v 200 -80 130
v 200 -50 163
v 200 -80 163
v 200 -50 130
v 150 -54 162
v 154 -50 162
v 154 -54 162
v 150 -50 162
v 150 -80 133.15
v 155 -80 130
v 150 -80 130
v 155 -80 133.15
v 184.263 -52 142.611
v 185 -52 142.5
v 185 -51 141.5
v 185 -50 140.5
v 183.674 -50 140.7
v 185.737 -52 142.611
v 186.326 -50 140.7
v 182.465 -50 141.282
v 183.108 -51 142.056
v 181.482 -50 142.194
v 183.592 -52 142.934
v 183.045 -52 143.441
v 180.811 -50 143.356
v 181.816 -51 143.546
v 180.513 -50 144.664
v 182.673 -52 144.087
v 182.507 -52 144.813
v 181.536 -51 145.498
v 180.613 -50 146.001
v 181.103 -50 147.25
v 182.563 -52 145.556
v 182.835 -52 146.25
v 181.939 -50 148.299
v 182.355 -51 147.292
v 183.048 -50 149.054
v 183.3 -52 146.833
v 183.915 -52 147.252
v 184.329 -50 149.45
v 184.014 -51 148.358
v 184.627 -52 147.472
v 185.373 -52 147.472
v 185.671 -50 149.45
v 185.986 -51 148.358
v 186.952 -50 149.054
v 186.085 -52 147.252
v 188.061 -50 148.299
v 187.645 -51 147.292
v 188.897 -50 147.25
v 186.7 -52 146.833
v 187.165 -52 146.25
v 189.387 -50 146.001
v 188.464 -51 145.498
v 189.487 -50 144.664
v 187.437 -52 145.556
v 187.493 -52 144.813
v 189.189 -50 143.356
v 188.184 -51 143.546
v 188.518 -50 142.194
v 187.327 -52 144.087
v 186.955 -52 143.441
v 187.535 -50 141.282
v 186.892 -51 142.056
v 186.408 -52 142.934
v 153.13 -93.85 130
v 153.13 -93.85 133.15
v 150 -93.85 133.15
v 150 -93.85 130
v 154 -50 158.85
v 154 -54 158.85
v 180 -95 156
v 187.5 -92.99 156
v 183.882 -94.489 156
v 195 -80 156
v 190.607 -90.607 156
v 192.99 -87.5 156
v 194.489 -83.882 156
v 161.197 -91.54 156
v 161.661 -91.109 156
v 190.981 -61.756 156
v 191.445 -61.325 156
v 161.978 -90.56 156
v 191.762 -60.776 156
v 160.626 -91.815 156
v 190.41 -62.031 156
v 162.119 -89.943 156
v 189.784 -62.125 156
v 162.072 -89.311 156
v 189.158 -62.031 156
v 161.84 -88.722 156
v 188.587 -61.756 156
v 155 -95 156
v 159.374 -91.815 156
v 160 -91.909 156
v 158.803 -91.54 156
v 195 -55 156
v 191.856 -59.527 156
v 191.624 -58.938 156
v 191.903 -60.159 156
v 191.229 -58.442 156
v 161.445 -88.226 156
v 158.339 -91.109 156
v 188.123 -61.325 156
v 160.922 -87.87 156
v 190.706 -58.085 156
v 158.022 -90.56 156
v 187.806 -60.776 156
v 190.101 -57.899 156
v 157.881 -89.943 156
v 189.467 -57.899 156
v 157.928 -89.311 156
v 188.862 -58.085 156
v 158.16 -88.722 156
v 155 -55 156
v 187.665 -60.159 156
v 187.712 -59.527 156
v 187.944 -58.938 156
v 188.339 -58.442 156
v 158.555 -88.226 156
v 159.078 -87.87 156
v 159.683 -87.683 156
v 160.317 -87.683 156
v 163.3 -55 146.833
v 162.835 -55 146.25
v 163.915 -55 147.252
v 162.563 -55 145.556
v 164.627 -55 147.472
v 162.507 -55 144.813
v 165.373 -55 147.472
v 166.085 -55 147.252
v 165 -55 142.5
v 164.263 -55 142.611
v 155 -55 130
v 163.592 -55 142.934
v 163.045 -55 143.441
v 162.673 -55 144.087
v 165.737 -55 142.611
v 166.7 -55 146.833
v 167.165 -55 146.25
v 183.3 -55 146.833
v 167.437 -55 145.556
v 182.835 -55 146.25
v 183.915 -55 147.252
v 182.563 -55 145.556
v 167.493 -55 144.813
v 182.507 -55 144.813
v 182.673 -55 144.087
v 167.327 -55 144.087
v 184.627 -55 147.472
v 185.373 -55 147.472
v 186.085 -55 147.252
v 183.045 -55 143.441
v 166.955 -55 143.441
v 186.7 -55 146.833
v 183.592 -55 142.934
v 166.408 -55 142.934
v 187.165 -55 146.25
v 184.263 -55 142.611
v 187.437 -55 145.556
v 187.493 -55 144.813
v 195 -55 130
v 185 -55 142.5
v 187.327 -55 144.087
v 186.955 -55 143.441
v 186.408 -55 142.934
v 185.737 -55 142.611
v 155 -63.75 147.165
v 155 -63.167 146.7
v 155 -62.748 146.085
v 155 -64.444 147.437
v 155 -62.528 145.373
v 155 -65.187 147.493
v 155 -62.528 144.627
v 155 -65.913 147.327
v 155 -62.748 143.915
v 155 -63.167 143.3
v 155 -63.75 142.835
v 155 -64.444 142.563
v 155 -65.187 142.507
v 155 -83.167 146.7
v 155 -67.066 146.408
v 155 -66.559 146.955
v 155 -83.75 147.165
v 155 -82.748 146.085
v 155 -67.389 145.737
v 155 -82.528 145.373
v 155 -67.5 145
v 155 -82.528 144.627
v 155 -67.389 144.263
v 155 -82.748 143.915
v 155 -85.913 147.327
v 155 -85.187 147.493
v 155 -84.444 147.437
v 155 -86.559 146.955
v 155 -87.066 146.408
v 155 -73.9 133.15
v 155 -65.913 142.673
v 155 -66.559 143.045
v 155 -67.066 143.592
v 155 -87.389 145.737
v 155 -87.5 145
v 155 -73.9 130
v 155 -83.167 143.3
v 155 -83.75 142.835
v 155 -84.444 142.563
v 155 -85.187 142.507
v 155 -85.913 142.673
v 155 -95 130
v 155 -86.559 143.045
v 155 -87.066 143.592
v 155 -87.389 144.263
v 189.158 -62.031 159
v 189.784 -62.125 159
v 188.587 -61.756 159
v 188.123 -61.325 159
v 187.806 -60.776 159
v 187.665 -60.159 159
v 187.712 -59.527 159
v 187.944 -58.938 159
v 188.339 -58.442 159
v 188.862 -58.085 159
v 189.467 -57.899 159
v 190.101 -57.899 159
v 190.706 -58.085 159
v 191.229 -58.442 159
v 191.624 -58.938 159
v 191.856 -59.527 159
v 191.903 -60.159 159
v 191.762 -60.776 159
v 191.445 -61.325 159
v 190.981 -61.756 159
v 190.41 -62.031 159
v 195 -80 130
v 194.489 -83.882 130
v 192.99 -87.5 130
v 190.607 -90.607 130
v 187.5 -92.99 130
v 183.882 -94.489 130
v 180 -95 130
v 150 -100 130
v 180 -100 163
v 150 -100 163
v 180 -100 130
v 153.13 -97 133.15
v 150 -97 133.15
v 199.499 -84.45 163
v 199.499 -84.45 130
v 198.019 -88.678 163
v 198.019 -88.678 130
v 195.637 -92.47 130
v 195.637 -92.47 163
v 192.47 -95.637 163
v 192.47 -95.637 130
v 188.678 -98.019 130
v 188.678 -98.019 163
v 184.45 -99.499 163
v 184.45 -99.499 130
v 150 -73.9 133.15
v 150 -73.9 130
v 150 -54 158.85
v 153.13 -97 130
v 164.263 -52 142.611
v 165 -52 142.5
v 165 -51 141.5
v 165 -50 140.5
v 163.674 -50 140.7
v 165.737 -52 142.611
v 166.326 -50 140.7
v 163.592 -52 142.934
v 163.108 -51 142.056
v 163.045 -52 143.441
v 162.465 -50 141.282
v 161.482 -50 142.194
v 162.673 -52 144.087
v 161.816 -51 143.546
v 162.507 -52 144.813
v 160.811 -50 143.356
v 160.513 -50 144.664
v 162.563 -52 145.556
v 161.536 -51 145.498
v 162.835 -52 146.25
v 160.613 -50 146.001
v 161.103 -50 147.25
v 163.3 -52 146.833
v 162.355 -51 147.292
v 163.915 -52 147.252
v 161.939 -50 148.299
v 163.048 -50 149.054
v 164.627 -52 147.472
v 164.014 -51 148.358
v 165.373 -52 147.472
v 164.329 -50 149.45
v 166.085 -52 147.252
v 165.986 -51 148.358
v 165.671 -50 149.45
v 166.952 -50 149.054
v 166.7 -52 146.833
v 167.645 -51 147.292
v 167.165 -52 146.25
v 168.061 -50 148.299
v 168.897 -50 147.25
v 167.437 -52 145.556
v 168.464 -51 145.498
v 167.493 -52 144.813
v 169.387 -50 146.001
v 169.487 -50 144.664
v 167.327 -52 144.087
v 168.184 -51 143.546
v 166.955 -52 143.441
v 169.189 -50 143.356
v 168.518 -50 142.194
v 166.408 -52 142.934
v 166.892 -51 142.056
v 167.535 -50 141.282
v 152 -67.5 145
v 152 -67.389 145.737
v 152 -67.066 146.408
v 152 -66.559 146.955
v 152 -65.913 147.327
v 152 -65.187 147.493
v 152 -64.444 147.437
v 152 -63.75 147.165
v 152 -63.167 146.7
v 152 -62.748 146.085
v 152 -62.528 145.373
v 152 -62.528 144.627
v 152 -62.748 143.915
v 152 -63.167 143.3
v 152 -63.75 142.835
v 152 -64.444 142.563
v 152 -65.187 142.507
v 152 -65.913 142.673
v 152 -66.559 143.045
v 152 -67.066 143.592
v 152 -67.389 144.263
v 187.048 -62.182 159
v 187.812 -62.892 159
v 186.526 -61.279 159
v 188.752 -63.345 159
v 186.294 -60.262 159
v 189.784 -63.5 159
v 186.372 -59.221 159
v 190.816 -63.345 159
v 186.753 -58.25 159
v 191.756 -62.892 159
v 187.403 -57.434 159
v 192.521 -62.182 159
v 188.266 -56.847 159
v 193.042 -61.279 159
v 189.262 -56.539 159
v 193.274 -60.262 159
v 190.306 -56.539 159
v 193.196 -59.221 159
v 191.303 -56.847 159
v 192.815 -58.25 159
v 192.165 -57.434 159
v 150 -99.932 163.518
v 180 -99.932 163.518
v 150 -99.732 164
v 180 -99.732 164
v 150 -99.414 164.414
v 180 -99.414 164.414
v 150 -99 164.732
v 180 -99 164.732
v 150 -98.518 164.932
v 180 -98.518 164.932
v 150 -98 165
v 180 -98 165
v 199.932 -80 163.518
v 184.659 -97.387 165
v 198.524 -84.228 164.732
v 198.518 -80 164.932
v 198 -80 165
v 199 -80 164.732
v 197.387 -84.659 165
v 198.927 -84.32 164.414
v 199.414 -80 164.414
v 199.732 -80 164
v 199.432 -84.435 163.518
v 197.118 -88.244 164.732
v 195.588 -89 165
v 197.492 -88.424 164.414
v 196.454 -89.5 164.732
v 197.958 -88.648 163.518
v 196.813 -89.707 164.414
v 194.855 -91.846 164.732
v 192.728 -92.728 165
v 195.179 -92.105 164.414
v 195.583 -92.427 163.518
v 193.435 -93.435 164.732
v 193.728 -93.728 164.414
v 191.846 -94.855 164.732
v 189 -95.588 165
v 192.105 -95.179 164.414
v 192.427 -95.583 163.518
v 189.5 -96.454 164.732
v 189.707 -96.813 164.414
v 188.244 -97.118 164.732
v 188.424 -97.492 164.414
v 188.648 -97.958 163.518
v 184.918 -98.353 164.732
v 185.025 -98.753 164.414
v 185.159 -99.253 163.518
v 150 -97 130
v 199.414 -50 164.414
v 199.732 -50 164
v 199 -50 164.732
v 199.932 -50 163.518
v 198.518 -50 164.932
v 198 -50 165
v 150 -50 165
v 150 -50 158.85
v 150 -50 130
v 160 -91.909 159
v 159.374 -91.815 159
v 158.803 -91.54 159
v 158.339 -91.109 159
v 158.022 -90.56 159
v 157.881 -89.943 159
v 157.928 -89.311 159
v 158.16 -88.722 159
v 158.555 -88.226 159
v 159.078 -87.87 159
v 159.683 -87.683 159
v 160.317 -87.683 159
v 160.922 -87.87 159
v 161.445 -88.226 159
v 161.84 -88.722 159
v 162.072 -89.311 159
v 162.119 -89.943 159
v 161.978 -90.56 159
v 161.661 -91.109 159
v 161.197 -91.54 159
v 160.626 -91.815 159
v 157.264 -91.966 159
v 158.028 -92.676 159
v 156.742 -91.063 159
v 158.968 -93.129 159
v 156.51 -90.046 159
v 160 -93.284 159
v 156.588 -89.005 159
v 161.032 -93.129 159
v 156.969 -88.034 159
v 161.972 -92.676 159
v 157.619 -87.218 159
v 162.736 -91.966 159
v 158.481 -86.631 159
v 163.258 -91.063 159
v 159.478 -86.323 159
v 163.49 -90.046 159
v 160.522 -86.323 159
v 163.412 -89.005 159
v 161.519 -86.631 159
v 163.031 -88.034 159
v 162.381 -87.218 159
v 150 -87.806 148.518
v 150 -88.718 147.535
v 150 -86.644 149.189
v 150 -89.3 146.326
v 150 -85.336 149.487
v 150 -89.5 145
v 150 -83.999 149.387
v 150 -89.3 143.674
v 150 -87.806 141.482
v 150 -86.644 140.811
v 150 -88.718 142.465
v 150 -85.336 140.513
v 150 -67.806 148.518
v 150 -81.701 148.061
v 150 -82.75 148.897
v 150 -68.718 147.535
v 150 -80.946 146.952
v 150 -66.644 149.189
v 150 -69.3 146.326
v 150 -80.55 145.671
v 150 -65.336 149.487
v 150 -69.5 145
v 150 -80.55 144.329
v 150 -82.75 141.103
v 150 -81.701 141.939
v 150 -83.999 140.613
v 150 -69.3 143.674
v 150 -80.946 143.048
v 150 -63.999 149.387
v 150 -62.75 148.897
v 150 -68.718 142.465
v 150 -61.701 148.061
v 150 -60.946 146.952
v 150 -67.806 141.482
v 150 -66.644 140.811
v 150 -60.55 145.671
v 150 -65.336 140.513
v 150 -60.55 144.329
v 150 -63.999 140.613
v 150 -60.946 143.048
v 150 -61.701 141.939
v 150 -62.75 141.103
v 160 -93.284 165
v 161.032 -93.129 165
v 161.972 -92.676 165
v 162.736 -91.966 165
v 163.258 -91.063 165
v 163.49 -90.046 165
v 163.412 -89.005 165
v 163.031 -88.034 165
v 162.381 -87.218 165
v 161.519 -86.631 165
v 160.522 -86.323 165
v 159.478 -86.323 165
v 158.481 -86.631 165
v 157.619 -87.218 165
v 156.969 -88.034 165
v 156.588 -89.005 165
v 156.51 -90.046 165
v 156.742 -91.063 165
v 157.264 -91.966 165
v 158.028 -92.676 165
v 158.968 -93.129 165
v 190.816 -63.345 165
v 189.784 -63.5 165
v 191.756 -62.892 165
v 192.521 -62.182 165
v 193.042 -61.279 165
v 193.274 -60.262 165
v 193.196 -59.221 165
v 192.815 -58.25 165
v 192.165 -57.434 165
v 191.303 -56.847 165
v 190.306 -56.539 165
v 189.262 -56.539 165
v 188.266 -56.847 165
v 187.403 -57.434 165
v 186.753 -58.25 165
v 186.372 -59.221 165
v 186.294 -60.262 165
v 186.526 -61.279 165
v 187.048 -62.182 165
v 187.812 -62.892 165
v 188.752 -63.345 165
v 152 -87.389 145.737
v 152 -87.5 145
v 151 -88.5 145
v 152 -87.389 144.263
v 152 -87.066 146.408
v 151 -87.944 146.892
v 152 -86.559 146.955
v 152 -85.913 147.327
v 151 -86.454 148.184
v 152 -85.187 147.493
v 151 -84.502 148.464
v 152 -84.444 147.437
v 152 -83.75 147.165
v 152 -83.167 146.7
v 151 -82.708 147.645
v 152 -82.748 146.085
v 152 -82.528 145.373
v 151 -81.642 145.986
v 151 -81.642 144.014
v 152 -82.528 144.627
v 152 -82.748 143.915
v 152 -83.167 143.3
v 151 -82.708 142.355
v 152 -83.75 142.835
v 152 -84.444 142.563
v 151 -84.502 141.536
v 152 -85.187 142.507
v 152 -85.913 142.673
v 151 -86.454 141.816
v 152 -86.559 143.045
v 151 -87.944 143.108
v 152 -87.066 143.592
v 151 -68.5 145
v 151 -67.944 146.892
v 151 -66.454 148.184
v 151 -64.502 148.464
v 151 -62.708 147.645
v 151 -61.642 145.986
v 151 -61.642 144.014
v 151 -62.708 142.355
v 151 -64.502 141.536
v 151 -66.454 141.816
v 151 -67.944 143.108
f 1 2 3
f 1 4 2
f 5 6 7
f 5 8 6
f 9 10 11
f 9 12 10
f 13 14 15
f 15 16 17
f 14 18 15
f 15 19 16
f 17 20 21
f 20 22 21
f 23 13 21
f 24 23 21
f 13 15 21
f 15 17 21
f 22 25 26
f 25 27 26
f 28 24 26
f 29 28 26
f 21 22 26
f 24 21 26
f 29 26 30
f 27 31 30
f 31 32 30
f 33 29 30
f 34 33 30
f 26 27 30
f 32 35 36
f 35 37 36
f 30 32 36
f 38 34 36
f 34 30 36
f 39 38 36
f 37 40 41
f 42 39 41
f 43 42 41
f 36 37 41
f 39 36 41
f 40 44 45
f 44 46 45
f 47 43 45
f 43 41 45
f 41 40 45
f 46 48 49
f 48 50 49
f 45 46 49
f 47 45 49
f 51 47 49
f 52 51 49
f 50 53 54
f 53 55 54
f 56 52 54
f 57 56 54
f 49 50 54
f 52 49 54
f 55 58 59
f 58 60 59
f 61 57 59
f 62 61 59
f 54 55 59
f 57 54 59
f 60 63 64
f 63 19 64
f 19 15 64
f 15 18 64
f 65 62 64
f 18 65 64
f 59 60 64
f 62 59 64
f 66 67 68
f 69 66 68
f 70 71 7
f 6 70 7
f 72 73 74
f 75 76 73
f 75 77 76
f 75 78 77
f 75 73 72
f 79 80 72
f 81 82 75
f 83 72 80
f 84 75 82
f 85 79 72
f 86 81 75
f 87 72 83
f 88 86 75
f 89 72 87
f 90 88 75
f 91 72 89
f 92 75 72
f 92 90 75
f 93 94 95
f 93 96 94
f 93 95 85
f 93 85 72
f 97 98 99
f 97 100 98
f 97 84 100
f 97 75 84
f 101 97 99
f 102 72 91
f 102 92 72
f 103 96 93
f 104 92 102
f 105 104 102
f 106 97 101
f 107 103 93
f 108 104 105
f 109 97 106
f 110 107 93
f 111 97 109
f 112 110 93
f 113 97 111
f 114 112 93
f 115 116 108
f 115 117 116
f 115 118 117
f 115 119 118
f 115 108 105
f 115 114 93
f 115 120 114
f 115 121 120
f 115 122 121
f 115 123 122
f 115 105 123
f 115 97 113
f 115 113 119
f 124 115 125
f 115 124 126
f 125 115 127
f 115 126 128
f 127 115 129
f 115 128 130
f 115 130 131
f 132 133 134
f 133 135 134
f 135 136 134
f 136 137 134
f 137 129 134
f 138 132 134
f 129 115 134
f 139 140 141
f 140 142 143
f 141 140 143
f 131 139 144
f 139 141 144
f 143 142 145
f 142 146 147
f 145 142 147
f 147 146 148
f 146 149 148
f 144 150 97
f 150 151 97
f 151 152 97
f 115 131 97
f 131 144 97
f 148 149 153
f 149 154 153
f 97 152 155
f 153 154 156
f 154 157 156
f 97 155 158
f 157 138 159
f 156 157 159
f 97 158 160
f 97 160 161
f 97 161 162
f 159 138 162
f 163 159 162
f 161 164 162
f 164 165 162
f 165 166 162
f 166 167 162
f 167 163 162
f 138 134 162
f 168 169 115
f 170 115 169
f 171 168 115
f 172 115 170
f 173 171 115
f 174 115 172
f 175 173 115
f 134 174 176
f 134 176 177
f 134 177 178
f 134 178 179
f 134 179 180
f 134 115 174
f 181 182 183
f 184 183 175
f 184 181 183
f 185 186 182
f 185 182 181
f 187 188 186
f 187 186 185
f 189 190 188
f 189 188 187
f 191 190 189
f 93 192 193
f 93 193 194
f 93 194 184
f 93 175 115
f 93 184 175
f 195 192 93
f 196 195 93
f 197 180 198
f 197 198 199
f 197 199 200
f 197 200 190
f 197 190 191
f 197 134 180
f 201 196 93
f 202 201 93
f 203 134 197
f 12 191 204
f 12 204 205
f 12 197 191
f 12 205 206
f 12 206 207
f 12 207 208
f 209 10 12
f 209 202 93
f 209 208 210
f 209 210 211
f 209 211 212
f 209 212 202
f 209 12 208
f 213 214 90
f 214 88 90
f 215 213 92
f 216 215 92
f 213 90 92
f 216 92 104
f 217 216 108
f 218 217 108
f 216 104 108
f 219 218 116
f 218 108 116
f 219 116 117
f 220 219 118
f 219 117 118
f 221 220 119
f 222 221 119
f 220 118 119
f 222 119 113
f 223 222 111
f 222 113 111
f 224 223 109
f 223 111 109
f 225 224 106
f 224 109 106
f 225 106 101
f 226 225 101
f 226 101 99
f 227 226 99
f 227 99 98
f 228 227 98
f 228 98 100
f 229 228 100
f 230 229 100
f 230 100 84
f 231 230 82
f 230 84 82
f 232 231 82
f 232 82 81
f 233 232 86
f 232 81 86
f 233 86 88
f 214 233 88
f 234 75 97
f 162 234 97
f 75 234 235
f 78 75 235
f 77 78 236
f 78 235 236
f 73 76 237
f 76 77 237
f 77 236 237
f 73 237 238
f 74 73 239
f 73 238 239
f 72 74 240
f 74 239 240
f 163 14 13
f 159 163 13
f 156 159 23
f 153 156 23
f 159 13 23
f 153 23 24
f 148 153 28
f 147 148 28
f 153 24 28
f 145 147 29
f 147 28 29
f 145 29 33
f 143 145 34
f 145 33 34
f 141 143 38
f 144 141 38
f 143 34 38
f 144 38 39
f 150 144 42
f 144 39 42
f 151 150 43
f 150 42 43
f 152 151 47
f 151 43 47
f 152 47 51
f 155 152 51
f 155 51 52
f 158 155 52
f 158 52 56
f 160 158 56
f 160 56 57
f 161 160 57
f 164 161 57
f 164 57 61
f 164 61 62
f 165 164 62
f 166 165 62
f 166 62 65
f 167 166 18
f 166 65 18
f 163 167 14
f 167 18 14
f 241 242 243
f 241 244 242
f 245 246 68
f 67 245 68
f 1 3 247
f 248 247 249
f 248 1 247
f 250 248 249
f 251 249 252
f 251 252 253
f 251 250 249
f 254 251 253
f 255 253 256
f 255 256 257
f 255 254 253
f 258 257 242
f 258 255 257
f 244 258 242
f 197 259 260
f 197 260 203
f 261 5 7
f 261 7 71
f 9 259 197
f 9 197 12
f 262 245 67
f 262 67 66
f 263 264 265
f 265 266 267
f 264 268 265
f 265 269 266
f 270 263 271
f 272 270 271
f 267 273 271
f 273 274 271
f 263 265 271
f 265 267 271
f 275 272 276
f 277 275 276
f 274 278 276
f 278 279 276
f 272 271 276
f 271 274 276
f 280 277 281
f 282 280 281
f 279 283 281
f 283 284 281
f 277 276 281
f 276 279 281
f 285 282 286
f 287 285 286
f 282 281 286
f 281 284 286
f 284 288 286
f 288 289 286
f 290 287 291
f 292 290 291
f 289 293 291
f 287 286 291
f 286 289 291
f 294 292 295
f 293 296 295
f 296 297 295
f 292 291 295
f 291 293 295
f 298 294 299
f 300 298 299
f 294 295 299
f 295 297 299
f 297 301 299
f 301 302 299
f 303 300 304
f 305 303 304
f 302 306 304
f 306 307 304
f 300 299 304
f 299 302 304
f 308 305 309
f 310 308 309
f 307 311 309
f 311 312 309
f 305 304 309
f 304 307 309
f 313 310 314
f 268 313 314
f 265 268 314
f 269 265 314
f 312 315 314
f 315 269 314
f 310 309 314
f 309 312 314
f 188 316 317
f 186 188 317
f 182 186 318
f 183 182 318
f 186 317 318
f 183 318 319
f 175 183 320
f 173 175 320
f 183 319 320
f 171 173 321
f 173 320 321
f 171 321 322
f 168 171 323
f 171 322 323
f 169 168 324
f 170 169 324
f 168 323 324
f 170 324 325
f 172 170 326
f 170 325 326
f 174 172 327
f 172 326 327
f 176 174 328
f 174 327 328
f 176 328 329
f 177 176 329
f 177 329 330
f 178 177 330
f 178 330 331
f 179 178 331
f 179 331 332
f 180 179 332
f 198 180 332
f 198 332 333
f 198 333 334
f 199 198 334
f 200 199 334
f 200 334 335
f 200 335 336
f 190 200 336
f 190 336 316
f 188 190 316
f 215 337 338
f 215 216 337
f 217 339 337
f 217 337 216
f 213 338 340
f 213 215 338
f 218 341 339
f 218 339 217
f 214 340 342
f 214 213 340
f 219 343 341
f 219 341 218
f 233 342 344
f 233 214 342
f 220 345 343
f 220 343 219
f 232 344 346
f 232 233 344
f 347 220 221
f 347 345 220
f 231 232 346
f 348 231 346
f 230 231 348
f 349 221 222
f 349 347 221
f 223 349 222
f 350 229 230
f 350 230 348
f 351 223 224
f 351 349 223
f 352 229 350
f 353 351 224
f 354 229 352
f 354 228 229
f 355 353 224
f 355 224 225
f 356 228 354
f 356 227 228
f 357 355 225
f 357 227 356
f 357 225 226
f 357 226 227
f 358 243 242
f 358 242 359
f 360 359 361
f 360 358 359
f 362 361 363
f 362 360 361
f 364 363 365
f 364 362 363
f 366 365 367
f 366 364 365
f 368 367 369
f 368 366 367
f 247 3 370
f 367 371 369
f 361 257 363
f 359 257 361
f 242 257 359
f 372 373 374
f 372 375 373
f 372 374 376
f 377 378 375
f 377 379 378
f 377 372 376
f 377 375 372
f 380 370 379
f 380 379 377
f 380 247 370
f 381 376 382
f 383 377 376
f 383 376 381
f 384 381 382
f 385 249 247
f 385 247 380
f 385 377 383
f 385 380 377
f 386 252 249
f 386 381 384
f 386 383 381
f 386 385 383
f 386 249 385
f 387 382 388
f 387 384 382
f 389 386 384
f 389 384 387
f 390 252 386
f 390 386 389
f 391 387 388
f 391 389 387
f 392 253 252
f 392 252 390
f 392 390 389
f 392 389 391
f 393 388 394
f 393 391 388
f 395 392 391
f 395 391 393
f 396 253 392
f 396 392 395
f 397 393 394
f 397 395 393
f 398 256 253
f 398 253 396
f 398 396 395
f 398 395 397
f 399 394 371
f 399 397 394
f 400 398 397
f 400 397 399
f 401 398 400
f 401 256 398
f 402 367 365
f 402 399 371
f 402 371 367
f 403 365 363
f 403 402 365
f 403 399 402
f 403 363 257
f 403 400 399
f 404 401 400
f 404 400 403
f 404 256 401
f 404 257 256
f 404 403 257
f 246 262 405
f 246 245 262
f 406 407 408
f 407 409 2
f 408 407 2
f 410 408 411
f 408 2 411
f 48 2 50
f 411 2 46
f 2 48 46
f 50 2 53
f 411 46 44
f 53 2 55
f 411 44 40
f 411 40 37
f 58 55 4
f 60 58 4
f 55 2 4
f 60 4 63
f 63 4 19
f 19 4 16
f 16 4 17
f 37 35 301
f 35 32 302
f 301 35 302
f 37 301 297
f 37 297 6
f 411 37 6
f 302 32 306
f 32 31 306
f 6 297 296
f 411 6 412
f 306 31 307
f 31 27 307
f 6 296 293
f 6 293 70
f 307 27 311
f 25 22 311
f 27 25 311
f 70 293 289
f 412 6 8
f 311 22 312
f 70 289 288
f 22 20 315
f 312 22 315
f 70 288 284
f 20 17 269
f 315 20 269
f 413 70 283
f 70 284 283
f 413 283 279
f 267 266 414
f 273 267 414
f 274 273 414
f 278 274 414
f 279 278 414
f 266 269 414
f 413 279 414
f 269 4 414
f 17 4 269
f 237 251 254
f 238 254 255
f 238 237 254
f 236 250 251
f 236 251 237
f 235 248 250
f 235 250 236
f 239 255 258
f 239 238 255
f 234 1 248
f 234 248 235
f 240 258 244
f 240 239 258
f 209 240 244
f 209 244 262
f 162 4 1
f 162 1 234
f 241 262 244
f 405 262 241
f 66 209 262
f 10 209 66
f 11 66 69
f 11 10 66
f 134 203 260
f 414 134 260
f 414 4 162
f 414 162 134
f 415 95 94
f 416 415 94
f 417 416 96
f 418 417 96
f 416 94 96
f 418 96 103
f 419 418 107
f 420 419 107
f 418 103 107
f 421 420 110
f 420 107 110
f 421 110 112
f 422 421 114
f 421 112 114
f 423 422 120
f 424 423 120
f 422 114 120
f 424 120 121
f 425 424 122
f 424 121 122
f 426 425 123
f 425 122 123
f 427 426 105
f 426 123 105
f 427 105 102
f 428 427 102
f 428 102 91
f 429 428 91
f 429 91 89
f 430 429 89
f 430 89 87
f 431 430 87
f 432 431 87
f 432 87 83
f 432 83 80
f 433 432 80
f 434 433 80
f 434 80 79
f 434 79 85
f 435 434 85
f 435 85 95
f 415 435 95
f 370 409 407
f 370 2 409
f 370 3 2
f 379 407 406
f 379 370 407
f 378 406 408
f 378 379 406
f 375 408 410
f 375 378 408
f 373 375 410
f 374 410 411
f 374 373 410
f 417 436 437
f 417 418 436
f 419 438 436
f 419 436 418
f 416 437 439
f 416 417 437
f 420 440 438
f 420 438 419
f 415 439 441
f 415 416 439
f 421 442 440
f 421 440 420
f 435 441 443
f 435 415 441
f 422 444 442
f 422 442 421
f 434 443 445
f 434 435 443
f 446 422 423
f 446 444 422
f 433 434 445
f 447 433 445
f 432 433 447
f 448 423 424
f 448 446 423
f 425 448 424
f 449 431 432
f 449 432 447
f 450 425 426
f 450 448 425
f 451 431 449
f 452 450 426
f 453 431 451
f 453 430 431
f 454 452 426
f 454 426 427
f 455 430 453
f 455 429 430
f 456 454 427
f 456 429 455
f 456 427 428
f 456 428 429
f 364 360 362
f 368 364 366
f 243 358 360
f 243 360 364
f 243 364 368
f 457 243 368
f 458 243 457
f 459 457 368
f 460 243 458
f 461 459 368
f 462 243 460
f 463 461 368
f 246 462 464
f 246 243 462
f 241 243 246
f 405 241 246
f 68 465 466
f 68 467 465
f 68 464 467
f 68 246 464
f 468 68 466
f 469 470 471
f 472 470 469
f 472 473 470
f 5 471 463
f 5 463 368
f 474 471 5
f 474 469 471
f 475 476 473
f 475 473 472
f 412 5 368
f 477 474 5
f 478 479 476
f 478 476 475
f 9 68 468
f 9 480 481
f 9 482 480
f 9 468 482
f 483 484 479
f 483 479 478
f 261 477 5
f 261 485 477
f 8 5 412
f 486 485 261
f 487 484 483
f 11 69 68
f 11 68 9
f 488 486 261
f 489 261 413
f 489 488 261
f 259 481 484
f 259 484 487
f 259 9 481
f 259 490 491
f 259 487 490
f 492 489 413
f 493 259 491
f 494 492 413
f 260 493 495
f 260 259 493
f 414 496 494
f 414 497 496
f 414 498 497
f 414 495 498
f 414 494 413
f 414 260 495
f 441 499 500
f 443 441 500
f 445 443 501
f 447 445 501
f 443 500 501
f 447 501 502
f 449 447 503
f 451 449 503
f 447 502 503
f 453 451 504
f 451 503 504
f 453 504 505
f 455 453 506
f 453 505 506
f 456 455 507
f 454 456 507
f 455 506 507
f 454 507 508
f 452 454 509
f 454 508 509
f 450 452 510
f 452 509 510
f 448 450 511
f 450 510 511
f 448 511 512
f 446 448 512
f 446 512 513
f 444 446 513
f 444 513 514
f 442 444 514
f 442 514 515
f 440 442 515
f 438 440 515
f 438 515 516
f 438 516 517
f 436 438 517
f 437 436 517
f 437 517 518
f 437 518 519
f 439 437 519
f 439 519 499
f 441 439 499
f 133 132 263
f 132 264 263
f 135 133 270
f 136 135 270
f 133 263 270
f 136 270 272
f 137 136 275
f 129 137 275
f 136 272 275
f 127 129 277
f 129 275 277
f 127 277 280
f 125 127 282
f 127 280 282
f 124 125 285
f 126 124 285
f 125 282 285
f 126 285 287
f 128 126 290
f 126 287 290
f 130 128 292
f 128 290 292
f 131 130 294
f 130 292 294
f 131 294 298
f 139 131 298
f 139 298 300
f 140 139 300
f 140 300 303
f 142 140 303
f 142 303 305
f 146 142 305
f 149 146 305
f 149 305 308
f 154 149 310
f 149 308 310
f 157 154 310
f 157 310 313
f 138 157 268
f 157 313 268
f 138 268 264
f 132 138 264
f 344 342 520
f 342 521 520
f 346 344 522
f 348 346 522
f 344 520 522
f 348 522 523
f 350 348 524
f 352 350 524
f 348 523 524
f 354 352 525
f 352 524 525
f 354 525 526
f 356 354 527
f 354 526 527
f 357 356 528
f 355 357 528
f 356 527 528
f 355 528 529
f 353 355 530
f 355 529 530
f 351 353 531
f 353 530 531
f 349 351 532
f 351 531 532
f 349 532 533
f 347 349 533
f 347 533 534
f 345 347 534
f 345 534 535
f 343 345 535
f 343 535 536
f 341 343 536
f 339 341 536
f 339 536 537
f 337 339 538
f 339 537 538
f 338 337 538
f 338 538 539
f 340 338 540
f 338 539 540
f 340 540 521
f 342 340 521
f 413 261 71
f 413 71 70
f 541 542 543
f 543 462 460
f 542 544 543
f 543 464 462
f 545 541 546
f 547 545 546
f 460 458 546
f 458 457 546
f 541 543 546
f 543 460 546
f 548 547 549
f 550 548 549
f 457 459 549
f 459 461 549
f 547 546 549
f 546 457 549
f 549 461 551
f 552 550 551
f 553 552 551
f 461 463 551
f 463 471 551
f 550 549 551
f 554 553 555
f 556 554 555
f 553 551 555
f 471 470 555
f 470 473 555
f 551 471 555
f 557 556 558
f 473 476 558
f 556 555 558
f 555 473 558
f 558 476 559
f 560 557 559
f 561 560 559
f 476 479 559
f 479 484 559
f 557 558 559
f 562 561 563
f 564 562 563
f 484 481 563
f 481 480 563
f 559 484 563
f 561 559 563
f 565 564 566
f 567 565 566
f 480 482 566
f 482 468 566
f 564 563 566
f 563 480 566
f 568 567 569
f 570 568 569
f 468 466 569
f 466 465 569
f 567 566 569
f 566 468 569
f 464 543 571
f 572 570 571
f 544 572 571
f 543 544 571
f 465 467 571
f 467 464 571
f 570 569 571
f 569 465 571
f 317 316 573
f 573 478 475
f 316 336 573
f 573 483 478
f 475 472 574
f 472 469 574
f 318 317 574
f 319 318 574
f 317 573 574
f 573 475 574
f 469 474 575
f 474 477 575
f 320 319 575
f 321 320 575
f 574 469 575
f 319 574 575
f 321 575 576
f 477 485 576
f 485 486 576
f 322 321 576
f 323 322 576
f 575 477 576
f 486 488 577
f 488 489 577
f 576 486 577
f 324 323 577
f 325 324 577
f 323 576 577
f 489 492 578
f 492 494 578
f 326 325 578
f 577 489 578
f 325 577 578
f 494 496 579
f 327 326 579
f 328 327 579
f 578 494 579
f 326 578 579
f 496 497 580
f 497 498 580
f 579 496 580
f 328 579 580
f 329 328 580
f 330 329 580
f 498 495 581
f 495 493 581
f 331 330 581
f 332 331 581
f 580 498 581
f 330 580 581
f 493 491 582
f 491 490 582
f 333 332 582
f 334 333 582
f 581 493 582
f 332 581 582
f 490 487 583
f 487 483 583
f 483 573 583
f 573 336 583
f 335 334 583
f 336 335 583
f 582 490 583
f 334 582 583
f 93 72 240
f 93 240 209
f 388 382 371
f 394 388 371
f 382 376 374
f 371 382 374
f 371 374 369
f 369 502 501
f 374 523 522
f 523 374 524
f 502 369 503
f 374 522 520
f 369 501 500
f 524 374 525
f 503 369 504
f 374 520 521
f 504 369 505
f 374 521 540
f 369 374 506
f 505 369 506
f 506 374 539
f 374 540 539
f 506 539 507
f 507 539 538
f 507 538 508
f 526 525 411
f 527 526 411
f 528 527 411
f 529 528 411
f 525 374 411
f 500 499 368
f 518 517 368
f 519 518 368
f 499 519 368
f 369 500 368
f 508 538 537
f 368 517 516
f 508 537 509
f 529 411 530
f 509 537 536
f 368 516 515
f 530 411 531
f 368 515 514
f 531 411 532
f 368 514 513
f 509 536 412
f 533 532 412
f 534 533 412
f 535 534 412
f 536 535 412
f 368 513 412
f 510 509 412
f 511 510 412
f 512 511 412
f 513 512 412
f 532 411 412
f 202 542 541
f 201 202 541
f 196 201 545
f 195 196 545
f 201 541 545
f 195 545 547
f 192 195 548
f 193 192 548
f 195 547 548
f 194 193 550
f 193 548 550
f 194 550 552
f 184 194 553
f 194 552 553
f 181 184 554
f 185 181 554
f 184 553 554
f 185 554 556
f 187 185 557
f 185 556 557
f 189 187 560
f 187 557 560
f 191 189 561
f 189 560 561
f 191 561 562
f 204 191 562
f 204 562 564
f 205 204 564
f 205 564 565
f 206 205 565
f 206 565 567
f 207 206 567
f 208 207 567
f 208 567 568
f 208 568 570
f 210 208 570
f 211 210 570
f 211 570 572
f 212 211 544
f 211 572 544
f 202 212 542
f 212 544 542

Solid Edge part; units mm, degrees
sketch "Sketch1" plane through (0, 0, 0) normal (0, 0, -1) x (-1, 0, 0)
  line L0 (-200, -100) -> (200, -100)
  line L1 (200, -100) -> (200, 100)
  line L2 (200, 100) -> (-200, 100)
  line L3 (-200, 100) -> (-200, -100)
extrude "Protrusion1" add sketch "Sketch1" against normal blind 250
sketch "Sketch2" plane through (0, 0, 0) normal (0, 0, -1) x (-1, 0, 0)
  circle A0 centre (100, 0) radius 50
  dimension "D1" = 200
extrude "Cutout1" cut sketch "Sketch2" against normal blind 3
fillet "Round_8" radius 20 4 edges at (200, -100, 125) (200, 100, 125) (-200, 100, 125) (-200, -100, 125)
fillet "Round_9" radius 30 8 edges at (0, -100, 0) (-194.1421, -94.1421, 0) (-200, 0, 0) (-194.1421, 94.1421, 0) (0, 100, 0) (194.1421, 94.1421, 0) (200, 0, 0) (194.1421, -94.1421, 0)
sketch "Sketch3" plane through (200, 0, 140) normal (1, 0, 0) x (0, -1, 0)
  line L0 (70, 57.1371) -> (-70, 57.1371)
  line L1 (-70, 57.1371) -> (-70, 97.1371)
  line L2 (-70, 97.1371) -> (70, 97.1371)
  line L3 (70, 97.1371) -> (70, 57.1371)
  dimension "D1" = 70
extrude "ExtrudedCutout_37" cut sketch "Sketch3" against normal blind 30
sketch "Sketch4" plane through (185, 0, 82.8629) normal (0, 0, -1) x (0, -1, 0)
  line L0 (-70, 15) -> (70, 15)
  line L1 (70, 15) -> (70, 10)
  line L2 (70, 10) -> (-70, 10)
  line L3 (-70, 10) -> (-70, 15)
extrude "Cutout2" cut sketch "Sketch4" against normal blind 5
sketch "Sketch5" plane through (185, 0, 42.8629) normal (0, 0, 1) x (0, -1, 0)
  line L0 (-70, -10) -> (70, -10)
  line L1 (70, -10) -> (70, -15)
  line L2 (70, -15) -> (-70, -15)
  line L3 (-70, -15) -> (-70, -10)
extrude "ExtrudedCutout_39" cut sketch "Sketch5" against normal blind 5
sketch "Sketch6" plane through (185, 70, 62.8629) normal (0, -1, 0) x (1, 0, 0)
  line L0 (-15, 25) -> (-10, 25)
  line L1 (-10, 25) -> (-10, -25)
  line L2 (-10, -25) -> (-15, -25)
  line L3 (-15, -25) -> (-15, 25)
extrude "Cutout3" cut sketch "Sketch6" against normal blind 5
sketch "Sketch7" plane through (185, -70, 62.8629) normal (0, 1, 0) x (1, 0, 0)
  line L0 (-15, 25) -> (-10, 25)
  line L1 (-10, 25) -> (-10, -25)
  line L2 (-10, -25) -> (-15, -25)
  line L3 (-15, -25) -> (-15, 25)
extrude "Cutout4" cut sketch "Sketch7" against normal blind 5
sketch "Sketch8" plane through (170, 0, 62.8629) normal (1, 0, 0) x (0, -1, 0)
  line L0 (-75, 25) -> (75, 25)
  line L1 (75, 25) -> (75, -25)
  line L2 (75, -25) -> (-75, -25)
  line L3 (-75, -25) -> (-75, 25)
  line L4 (72, 22.1284) -> (-72, 22.1284)
  line L5 (-72, 22.1284) -> (-72, -21.8716)
  line L6 (-72, -21.8716) -> (72, -21.8716)
  line L7 (72, -21.8716) -> (72, 22.1284)
  dimension "D1" = 75
extrude "ExtrudedCutout_42" cut sketch "Sketch8" along normal mid plane 10
sketch "Sketch9" plane through (200, 0, 140) normal (1, 0, 0) x (0, -1, 0)
  circle A0 centre (0, -30) radius 68.3204
extrude "Cutout5" cut sketch "Sketch9" against normal blind 6
sketch "Sketch10" plane through (0, 0, 250) normal (0, 0, 1) x (-1, 0, 0)
  line L0 (-180, 100) -> (180, 100)
  line L1 (180, 100) -> (180, 97)
  line L2 (180, 97) -> (-180, 97)
  line L3 (-180, 97) -> (-180, 100)
  line L4 (200, 80) -> (197, 80)
  line L5 (197, 80) -> (197, -80)
  line L6 (197, -80) -> (200, -80)
  line L7 (200, -80) -> (200, 80)
  line L8 (-200, 80) -> (-197, 80)
  line L9 (-197, 80) -> (-197, -80)
  line L10 (-197, -80) -> (-200, -80)
  line L11 (-200, -80) -> (-200, 80)
  line L12 (-180, -100) -> (180, -100)
  line L13 (180, -100) -> (180, -97)
  line L14 (180, -97) -> (-180, -97)
  line L15 (-180, -97) -> (-180, -100)
extrude "Cutout6" cut sketch "Sketch10" against normal blind 220
sketch "Sketch11" plane through (165, -97, 140) normal (0, -1, 0) x (0, 0, 1)
  line L0 (-110, 23.978) -> (116.0147, 23.978)
  line L1 (116.0147, 23.978) -> (116.0147, -38.9945)
  line L2 (116.0147, -38.9945) -> (-110, -38.9945)
  line L3 (-110, -38.9945) -> (-110, 23.978)
extrude "ExtrudedCutout_47" cut sketch "Sketch11" along normal mid plane 474
sketch "Sketch12" plane through (0, 0, 0) normal (0, 0, -1) x (-1, 0, 0)
  line L0 (-150, -121.4584) -> (-150, -50)
  line L1 (-254.1695, -50) -> (-150, -50)
  line L2 (-254.1695, -50) -> (-254.1695, 113.1592)
  line L3 (-254.1695, 113.1592) -> (264.7141, 113.1592)
  line L4 (264.7141, 113.1592) -> (271.856, -149.5027)
  line L5 (271.856, -149.5027) -> (-150, -121.4584)
extrude "ExtrudedCutout_46" cut sketch "Sketch12" against normal blind 317
sketch "Sketch13" plane through (175, -75, 30) normal (0, 0, 1) x (0, 1, 0)
  line L0 (17.7429, 25) -> (30.7571, 11.9857)
  line L1 (29.3143, 29.7) -> (30.7571, 11.9857)
  line L2 (17.7429, 25) -> (29.3143, 29.7)
extrude "Cutout7" cut sketch "Sketch13" against normal blind 15
sketch "Sketch14" plane through (153.6286, -53.6286, 22.5) normal (-0.7071, 0.7071, 0) x (0.7071, 0.7071, 0)
  line L0 (-5.1316, -2.5) -> (5.1316, -2.5)
  line L1 (5.1316, 2.97) -> (5.1316, -2.5)
  line L2 (-5.1316, 2.97) -> (5.1316, 2.97)
  line L3 (-5.1316, 2.97) -> (-5.1316, -2.5)
  dimension "D1" = 5.1316
extrude "ExtrudedCutout_49" cut sketch "Sketch14" against normal blind 46
sketch "Sketch15" plane through (175, -75, 30) normal (0, 0, 1) x (0, -1, 0)
  circle A0 centre (-17.7429, -17.7429) radius 1.5
extrude "ExtrudedCutout_50" cut sketch "Sketch15" against normal blind 9
sketch "Sketch16" plane through (175, -75, 30) normal (0, 0, 1) x (0, -1, 0)
  line L0 (5, -20) -> (-3, -20)
  line L1 (-3, -20) -> (-3, -15)
  line L2 (5, -15) -> (-3, -15)
  line L3 (5, -20) -> (5, -15)
  line L4 (-20, 5) -> (-20, -3)
  line L5 (-20, -3) -> (-15, -3)
  line L6 (-15, 5) -> (-15, -3)
  line L7 (-20, 5) -> (-15, 5)
  dimension "D1" = 5
  dimension "D2" = 3
extrude "Cutout8" cut sketch "Sketch16" against normal blind 10
sketch "Sketch17" plane through (175, -50, 15) normal (0, 1, 0) x (0, 0, 1)
  circle A0 centre (10, 1) radius 1.5
extrude "Cutout9" cut sketch "Sketch17" against normal blind 8
sketch "Sketch18" plane through (150, -75, 15) normal (-1, 0, 0) x (0, -1, 0)
  circle A0 centre (1.0029, 10) radius 1.5
extrude "Cutout10" cut sketch "Sketch18" against normal blind 9
sketch "Sketch19" plane through (150, -75, 15) normal (-1, 0, 0) x (0, -1, 0)
  circle A0 centre (-17, -7) radius 5
  circle A1 centre (14.7841, 4.53) radius 5
extrude "Cutout11" cut sketch "Sketch19" against normal blind 2
sketch "Sketch20" plane through (175, -50, 15) normal (0, 1, 0) x (-1, 0, 0)
  circle A0 centre (17, -7) radius 5
  circle A1 centre (-14.7841, 4.53) radius 5
extrude "Cutout12" cut sketch "Sketch20" against normal blind 2
fillet "Round_16" radius 5 1 edges at (153.6286, -53.6286, 15)
sketch "Sketch21" plane through (175, -75, 30) normal (0, 0, 1) x (0, -1, 0)
  circle A0 centre (-15, 14.7841) radius 5
  circle A1 centre (14.7841, -15) radius 5
extrude "ExtrudedCutout_56" cut sketch "Sketch21" against normal blind 3
sketch "Sketch22" plane through (169.892, -69.892, 19.53) normal (0, 0, 1) x (0.7071, -0.7071, 0)
  line L0 (23, 5.1316) -> (-12.8442, 5.1316)
  line L1 (-12.8442, 5.1316) -> (-12.8442, -5.1316)
  line L2 (-12.8442, -5.1316) -> (23, -5.1316)
  line L3 (23, -5.1316) -> (23, 5.1316)
extrude "ExtrudedProtrusion_20" add sketch "Sketch22" along normal blind 6
sketch "Sketch23" plane through (175, -75, 30) normal (0, 0, 1) x (0, -1, 0)
  arc A0 (5, 25) -> (25, 5) centre (5, 5) cw
  line L0 (25, 5) -> (25, -25)
  line L1 (25, -25) -> (-17.7429, -25)
  line L2 (-17.7429, -25) -> (-25, -17.7429)
  line L3 (-25, -17.7429) -> (-25, 25)
  line L4 (-25, 25) -> (5, 25)
  circle A1 centre (-15, 14.7841) radius 5
  circle A2 centre (14.7841, -15) radius 5
extrude "Protrusion2" add sketch "Sketch23" along normal blind 100
sketch "Sketch24" plane through (153.6286, -53.6286, 77.5) normal (-0.7071, 0.7071, 0) x (0, 0, 1)
  line L0 (-47.5, -40.0408) -> (-85.2138, -40.0408)
  line L1 (-85.2138, -40.0408) -> (-85.2138, 45.7641)
  line L2 (-85.2138, 45.7641) -> (-47.5, 45.7641)
  line L3 (-47.5, 45.7641) -> (-47.5, -40.0408)
extrude "ExtrudedCutout_57" cut sketch "Sketch24" along normal mid plane 148
sketch "Sketch25" plane through (175, -75, 130) normal (0, 0, 1) x (0, -1, 0)
  line L0 (-22, 22) -> (-22, 18.85)
  line L1 (-22, 18.85) -> (-25, 18.85)
  line L2 (-29.2429, 28.0796) -> (-25, 18.85)
  line L3 (-22, 28.0796) -> (-29.2429, 28.0796)
  line L4 (-22, 25) -> (-22, 28.0796)
  line L5 (-25, 22) -> (-22, 25)
  line L6 (-22, 22) -> (-25, 22)
  line L7 (22, -22) -> (18.85, -22)
  line L8 (18.85, -22) -> (18.85, -25)
  line L9 (28.0796, -29.2429) -> (18.85, -25)
  line L10 (28.0796, -22) -> (28.0796, -29.2429)
  line L11 (25, -22) -> (28.0796, -22)
  line L12 (22, -25) -> (25, -22)
  line L13 (22, -22) -> (22, -25)
extrude "Cutout13" cut sketch "Sketch25" against normal blind 148
sketch "Sketch26" plane through (175, -75, 130) normal (0, 0, 1) x (0, -1, 0)
  line L0 (5, -4) -> (5, -25)
  line L1 (5, -25) -> (-1.1, -25)
  line L2 (-1.1, -25) -> (-1.1, -4)
  line L3 (5, -4) -> (-1.1, -4)
extrude "ExtrudedCutout_60" cut sketch "Sketch26" against normal blind 186
sketch "Sketch27" plane through (160, -80, 80) normal (0, 1, 0) x (0, 0, 1)
  line L0 (-38.7574, -1.9959) -> (-41.2426, -1.9959)
  line L1 (-41.2426, -1.9959) -> (-43, -0.2385)
  line L2 (-43, -0.2385) -> (-43, 2.2467)
  line L3 (-43, 2.2467) -> (-41.2426, 4.0041)
  line L4 (-41.2426, 4.0041) -> (-38.7574, 4.0041)
  line L5 (-38.7574, 4.0041) -> (-37, 2.2467)
  line L6 (-37, 2.2467) -> (-37, -0.2385)
  line L7 (-37, -0.2385) -> (-38.7574, -1.9959)
  line L8 (38.7574, -1.9959) -> (41.2426, -1.9959)
  line L9 (41.2426, -1.9959) -> (43, -0.2385)
  line L10 (43, -0.2385) -> (43, 2.2467)
  line L11 (43, 2.2467) -> (41.2426, 4.0041)
  line L12 (41.2426, 4.0041) -> (38.7574, 4.0041)
  line L13 (38.7574, 4.0041) -> (37, 2.2467)
  line L14 (37, 2.2467) -> (37, -0.2385)
  line L15 (37, -0.2385) -> (38.7574, -1.9959)
  circle A0 centre (40, 1.0041) radius 2
extrude "Cutout14" cut sketch "Sketch27" against normal blind 3
sketch "Sketch28" plane through (160, -80, 80) normal (0, 1, 0) x (0, 0, 1)
  circle A0 centre (-40, 1.0041) radius 2
  circle A1 centre (40, 1.0041) radius 2
extrude "ExtrudedCutout_62" cut sketch "Sketch28" along normal blind 43
sketch "Sketch29" plane through (177.0686, -50, 80) normal (0, 1, 0) x (-1, 0, 0)
  circle A0 centre (16.0645, 40) radius 3
  circle A1 centre (16.0645, -40) radius 3
extrude "Cutout15" cut sketch "Sketch29" against normal blind 5
sketch "Sketch30" plane through (175, -75, 130) normal (0, 0, 1) x (0, -1, 0)
  line L0 (-1.1, -18.9657) -> (-27.9226, -18.9657)
  line L1 (-27.9226, -18.9657) -> (-17.7429, -25)
  line L2 (-17.7429, -25) -> (-1.1, -25)
  line L3 (-1.1, -25) -> (-1.1, -18.9657)
extrude "Cutout16" cut sketch "Sketch30" against normal blind 148
sketch "Sketch31" plane through (175, -75, 30) normal (0, 0, -1) x (0, 1, 0)
  line L0 (25, 4.7841) -> (5, 4.7841)
  line L1 (5, 4.7841) -> (5, 1.6341)
  line L2 (5, 1.6341) -> (25, 1.6341)
  line L3 (25, 1.6341) -> (25, 4.7841)
extrude "Cutout17" cut sketch "Sketch31" against normal blind 246
sketch "Sketch32" plane through (156.0343, -62.5614, 80) normal (-1, 0, 0) x (0, -1, 0)
  circle A0 centre (-0.0614, 0) radius 2
extrude "Cutout18" cut sketch "Sketch32" against normal blind 30
sketch "Sketch33" plane through (156.0343, -62.5614, 80) normal (-1, 0, 0) x (0, -1, 0)
  circle A0 centre (-0.0614, 0) radius 3
extrude "Cutout19" cut sketch "Sketch33" against normal blind 5
sketch "Sketch34" plane through (179.7841, -60, 80) normal (-1, 0, 0) x (0, 0, 1)
  line L0 (3, -3.7426) -> (3, -1.2574)
  line L1 (3, -1.2574) -> (1.2426, 0.5)
  line L2 (1.2426, 0.5) -> (-1.2426, 0.5)
  line L3 (-1.2426, 0.5) -> (-3, -1.2574)
  line L4 (-3, -1.2574) -> (-3, -3.7426)
  line L5 (-3, -3.7426) -> (-1.2426, -5.5)
  line L6 (-1.2426, -5.5) -> (1.2426, -5.5)
  line L7 (1.2426, -5.5) -> (3, -3.7426)
extrude "Cutout20" cut sketch "Sketch34" against normal blind 3
sketch "Sketch35" plane through (175, -75, 130) normal (0, 0, 1) x (0, -1, 0)
  line L0 (-22, 25) -> (5, 25)
  arc A0 (5, 25) -> (25, 5) centre (5, 5) cw
  line L1 (25, 5) -> (25, -22)
  line L2 (25, -22) -> (25, -25)
  line L3 (18.85, -25) -> (25, -25)
  line L4 (-25, -25) -> (18.85, -25)
  line L5 (-25, 18.85) -> (-25, -25)
  line L6 (-25, 25) -> (-25, 18.85)
  line L7 (-22, 25) -> (-25, 25)
  circle A1 centre (-15, 14.7841) radius 2.125
  circle A2 centre (14.7841, -15) radius 2.125
extrude "Protrusion3" add sketch "Sketch35" along normal blind 35
sketch "Sketch36" plane through (175, -75, 165) normal (0, 0, 1) x (0, -1, 0)
  circle A0 centre (-15, 14.7841) radius 3.5
  circle A1 centre (14.7841, -15) radius 3.5
extrude "ExtrudedCutout_69" cut sketch "Sketch36" against normal blind 6
sketch "Sketch37" plane through (150, -75, 97.5) normal (-1, 0, 0) x (0, -1, 0)
  line L0 (18.85, 32.5) -> (22, 32.5)
  line L1 (22, 32.5) -> (22, 35.65)
  line L2 (22, 35.65) -> (18.85, 35.65)
  line L3 (18.85, 35.65) -> (18.85, 32.5)
extrude "Cutout21" cut sketch "Sketch37" against normal blind 3.13
sketch "Sketch38" plane through (150, -75, 97.5) normal (-1, 0, 0) x (0, -1, 0)
  line L0 (5, 32.5) -> (-1.1, 32.5)
  line L1 (-1.1, 32.5) -> (-1.1, 35.65)
  line L2 (-1.1, 35.65) -> (5, 35.65)
  line L3 (5, 35.65) -> (5, 32.5)
extrude "Cutout22" cut sketch "Sketch38" against normal up to vertex (21 mm away)
sketch "Sketch39" plane through (150, -75, 97.5) normal (-1, 0, 0) x (0, -1, 0)
  circle A0 centre (-10, 47.5) radius 2.5
  circle A1 centre (10, 47.5) radius 2.5
extrude "ExtrudedCutout_73" cut sketch "Sketch39" against normal blind 5
chamfer "Chamfer_11" distance 2 angle 45 2 edges at (150, -82.5, 145) (150, -62.5, 145)
sketch "Sketch40" plane through (175, -50, 97.5) normal (0, 1, 0) x (0, 0, -1)
  circle A0 centre (-47.5, 10) radius 2.5
  circle A1 centre (-47.5, -10) radius 2.5
extrude "ExtrudedCutout_74" cut sketch "Sketch40" against normal blind 5
chamfer "Chamfer_12" distance 2 angle 45 2 edges at (165, -50, 147.5) (185, -50, 147.5)
sketch "Sketch41" plane through (150, -75, 97.5) normal (-1, 0, 0) x (0, -1, 0)
  line L0 (-34.1936, -74.2886) -> (53.2864, -74.2886)
  line L1 (53.2864, -74.2886) -> (53.2864, 32.5)
  line L2 (53.2864, 32.5) -> (-34.1936, 32.5)
  line L3 (-34.1936, 32.5) -> (-34.1936, -74.2886)
extrude "ExtrudedCutout_75" cut sketch "Sketch41" against normal blind 53
sketch "Sketch42" plane through (175, -75, 130) normal (0, 0, -1) x (0, -1, 0)
  line L0 (-20, 20) -> (-20, -20)
  line L1 (5, -20) -> (-20, -20)
  arc A0 (20, -5) -> (5, -20) centre (5, -5) cw
  line L2 (20, -5) -> (20, 20)
  line L3 (-20, 20) -> (20, 20)
extrude "Cutout23" cut sketch "Sketch42" against normal blind 26
sketch "Sketch43" plane through (150, -75, 147.5) normal (-1, 0, 0) x (0, 1, 0)
  line L0 (21, -11.35) -> (27.3, -11.35)
  line L1 (27.3, -11.35) -> (27.3, -14.5)
  line L2 (27.3, -14.5) -> (21, -14.5)
  line L3 (21, -14.5) -> (21, -11.35)
extrude "Cutout24" cut sketch "Sketch43" against normal blind 4
fillet "Round_21" radius 2 3 edges at (165, -100, 165) (194.1421, -94.1421, 165) (200, -65, 165)
